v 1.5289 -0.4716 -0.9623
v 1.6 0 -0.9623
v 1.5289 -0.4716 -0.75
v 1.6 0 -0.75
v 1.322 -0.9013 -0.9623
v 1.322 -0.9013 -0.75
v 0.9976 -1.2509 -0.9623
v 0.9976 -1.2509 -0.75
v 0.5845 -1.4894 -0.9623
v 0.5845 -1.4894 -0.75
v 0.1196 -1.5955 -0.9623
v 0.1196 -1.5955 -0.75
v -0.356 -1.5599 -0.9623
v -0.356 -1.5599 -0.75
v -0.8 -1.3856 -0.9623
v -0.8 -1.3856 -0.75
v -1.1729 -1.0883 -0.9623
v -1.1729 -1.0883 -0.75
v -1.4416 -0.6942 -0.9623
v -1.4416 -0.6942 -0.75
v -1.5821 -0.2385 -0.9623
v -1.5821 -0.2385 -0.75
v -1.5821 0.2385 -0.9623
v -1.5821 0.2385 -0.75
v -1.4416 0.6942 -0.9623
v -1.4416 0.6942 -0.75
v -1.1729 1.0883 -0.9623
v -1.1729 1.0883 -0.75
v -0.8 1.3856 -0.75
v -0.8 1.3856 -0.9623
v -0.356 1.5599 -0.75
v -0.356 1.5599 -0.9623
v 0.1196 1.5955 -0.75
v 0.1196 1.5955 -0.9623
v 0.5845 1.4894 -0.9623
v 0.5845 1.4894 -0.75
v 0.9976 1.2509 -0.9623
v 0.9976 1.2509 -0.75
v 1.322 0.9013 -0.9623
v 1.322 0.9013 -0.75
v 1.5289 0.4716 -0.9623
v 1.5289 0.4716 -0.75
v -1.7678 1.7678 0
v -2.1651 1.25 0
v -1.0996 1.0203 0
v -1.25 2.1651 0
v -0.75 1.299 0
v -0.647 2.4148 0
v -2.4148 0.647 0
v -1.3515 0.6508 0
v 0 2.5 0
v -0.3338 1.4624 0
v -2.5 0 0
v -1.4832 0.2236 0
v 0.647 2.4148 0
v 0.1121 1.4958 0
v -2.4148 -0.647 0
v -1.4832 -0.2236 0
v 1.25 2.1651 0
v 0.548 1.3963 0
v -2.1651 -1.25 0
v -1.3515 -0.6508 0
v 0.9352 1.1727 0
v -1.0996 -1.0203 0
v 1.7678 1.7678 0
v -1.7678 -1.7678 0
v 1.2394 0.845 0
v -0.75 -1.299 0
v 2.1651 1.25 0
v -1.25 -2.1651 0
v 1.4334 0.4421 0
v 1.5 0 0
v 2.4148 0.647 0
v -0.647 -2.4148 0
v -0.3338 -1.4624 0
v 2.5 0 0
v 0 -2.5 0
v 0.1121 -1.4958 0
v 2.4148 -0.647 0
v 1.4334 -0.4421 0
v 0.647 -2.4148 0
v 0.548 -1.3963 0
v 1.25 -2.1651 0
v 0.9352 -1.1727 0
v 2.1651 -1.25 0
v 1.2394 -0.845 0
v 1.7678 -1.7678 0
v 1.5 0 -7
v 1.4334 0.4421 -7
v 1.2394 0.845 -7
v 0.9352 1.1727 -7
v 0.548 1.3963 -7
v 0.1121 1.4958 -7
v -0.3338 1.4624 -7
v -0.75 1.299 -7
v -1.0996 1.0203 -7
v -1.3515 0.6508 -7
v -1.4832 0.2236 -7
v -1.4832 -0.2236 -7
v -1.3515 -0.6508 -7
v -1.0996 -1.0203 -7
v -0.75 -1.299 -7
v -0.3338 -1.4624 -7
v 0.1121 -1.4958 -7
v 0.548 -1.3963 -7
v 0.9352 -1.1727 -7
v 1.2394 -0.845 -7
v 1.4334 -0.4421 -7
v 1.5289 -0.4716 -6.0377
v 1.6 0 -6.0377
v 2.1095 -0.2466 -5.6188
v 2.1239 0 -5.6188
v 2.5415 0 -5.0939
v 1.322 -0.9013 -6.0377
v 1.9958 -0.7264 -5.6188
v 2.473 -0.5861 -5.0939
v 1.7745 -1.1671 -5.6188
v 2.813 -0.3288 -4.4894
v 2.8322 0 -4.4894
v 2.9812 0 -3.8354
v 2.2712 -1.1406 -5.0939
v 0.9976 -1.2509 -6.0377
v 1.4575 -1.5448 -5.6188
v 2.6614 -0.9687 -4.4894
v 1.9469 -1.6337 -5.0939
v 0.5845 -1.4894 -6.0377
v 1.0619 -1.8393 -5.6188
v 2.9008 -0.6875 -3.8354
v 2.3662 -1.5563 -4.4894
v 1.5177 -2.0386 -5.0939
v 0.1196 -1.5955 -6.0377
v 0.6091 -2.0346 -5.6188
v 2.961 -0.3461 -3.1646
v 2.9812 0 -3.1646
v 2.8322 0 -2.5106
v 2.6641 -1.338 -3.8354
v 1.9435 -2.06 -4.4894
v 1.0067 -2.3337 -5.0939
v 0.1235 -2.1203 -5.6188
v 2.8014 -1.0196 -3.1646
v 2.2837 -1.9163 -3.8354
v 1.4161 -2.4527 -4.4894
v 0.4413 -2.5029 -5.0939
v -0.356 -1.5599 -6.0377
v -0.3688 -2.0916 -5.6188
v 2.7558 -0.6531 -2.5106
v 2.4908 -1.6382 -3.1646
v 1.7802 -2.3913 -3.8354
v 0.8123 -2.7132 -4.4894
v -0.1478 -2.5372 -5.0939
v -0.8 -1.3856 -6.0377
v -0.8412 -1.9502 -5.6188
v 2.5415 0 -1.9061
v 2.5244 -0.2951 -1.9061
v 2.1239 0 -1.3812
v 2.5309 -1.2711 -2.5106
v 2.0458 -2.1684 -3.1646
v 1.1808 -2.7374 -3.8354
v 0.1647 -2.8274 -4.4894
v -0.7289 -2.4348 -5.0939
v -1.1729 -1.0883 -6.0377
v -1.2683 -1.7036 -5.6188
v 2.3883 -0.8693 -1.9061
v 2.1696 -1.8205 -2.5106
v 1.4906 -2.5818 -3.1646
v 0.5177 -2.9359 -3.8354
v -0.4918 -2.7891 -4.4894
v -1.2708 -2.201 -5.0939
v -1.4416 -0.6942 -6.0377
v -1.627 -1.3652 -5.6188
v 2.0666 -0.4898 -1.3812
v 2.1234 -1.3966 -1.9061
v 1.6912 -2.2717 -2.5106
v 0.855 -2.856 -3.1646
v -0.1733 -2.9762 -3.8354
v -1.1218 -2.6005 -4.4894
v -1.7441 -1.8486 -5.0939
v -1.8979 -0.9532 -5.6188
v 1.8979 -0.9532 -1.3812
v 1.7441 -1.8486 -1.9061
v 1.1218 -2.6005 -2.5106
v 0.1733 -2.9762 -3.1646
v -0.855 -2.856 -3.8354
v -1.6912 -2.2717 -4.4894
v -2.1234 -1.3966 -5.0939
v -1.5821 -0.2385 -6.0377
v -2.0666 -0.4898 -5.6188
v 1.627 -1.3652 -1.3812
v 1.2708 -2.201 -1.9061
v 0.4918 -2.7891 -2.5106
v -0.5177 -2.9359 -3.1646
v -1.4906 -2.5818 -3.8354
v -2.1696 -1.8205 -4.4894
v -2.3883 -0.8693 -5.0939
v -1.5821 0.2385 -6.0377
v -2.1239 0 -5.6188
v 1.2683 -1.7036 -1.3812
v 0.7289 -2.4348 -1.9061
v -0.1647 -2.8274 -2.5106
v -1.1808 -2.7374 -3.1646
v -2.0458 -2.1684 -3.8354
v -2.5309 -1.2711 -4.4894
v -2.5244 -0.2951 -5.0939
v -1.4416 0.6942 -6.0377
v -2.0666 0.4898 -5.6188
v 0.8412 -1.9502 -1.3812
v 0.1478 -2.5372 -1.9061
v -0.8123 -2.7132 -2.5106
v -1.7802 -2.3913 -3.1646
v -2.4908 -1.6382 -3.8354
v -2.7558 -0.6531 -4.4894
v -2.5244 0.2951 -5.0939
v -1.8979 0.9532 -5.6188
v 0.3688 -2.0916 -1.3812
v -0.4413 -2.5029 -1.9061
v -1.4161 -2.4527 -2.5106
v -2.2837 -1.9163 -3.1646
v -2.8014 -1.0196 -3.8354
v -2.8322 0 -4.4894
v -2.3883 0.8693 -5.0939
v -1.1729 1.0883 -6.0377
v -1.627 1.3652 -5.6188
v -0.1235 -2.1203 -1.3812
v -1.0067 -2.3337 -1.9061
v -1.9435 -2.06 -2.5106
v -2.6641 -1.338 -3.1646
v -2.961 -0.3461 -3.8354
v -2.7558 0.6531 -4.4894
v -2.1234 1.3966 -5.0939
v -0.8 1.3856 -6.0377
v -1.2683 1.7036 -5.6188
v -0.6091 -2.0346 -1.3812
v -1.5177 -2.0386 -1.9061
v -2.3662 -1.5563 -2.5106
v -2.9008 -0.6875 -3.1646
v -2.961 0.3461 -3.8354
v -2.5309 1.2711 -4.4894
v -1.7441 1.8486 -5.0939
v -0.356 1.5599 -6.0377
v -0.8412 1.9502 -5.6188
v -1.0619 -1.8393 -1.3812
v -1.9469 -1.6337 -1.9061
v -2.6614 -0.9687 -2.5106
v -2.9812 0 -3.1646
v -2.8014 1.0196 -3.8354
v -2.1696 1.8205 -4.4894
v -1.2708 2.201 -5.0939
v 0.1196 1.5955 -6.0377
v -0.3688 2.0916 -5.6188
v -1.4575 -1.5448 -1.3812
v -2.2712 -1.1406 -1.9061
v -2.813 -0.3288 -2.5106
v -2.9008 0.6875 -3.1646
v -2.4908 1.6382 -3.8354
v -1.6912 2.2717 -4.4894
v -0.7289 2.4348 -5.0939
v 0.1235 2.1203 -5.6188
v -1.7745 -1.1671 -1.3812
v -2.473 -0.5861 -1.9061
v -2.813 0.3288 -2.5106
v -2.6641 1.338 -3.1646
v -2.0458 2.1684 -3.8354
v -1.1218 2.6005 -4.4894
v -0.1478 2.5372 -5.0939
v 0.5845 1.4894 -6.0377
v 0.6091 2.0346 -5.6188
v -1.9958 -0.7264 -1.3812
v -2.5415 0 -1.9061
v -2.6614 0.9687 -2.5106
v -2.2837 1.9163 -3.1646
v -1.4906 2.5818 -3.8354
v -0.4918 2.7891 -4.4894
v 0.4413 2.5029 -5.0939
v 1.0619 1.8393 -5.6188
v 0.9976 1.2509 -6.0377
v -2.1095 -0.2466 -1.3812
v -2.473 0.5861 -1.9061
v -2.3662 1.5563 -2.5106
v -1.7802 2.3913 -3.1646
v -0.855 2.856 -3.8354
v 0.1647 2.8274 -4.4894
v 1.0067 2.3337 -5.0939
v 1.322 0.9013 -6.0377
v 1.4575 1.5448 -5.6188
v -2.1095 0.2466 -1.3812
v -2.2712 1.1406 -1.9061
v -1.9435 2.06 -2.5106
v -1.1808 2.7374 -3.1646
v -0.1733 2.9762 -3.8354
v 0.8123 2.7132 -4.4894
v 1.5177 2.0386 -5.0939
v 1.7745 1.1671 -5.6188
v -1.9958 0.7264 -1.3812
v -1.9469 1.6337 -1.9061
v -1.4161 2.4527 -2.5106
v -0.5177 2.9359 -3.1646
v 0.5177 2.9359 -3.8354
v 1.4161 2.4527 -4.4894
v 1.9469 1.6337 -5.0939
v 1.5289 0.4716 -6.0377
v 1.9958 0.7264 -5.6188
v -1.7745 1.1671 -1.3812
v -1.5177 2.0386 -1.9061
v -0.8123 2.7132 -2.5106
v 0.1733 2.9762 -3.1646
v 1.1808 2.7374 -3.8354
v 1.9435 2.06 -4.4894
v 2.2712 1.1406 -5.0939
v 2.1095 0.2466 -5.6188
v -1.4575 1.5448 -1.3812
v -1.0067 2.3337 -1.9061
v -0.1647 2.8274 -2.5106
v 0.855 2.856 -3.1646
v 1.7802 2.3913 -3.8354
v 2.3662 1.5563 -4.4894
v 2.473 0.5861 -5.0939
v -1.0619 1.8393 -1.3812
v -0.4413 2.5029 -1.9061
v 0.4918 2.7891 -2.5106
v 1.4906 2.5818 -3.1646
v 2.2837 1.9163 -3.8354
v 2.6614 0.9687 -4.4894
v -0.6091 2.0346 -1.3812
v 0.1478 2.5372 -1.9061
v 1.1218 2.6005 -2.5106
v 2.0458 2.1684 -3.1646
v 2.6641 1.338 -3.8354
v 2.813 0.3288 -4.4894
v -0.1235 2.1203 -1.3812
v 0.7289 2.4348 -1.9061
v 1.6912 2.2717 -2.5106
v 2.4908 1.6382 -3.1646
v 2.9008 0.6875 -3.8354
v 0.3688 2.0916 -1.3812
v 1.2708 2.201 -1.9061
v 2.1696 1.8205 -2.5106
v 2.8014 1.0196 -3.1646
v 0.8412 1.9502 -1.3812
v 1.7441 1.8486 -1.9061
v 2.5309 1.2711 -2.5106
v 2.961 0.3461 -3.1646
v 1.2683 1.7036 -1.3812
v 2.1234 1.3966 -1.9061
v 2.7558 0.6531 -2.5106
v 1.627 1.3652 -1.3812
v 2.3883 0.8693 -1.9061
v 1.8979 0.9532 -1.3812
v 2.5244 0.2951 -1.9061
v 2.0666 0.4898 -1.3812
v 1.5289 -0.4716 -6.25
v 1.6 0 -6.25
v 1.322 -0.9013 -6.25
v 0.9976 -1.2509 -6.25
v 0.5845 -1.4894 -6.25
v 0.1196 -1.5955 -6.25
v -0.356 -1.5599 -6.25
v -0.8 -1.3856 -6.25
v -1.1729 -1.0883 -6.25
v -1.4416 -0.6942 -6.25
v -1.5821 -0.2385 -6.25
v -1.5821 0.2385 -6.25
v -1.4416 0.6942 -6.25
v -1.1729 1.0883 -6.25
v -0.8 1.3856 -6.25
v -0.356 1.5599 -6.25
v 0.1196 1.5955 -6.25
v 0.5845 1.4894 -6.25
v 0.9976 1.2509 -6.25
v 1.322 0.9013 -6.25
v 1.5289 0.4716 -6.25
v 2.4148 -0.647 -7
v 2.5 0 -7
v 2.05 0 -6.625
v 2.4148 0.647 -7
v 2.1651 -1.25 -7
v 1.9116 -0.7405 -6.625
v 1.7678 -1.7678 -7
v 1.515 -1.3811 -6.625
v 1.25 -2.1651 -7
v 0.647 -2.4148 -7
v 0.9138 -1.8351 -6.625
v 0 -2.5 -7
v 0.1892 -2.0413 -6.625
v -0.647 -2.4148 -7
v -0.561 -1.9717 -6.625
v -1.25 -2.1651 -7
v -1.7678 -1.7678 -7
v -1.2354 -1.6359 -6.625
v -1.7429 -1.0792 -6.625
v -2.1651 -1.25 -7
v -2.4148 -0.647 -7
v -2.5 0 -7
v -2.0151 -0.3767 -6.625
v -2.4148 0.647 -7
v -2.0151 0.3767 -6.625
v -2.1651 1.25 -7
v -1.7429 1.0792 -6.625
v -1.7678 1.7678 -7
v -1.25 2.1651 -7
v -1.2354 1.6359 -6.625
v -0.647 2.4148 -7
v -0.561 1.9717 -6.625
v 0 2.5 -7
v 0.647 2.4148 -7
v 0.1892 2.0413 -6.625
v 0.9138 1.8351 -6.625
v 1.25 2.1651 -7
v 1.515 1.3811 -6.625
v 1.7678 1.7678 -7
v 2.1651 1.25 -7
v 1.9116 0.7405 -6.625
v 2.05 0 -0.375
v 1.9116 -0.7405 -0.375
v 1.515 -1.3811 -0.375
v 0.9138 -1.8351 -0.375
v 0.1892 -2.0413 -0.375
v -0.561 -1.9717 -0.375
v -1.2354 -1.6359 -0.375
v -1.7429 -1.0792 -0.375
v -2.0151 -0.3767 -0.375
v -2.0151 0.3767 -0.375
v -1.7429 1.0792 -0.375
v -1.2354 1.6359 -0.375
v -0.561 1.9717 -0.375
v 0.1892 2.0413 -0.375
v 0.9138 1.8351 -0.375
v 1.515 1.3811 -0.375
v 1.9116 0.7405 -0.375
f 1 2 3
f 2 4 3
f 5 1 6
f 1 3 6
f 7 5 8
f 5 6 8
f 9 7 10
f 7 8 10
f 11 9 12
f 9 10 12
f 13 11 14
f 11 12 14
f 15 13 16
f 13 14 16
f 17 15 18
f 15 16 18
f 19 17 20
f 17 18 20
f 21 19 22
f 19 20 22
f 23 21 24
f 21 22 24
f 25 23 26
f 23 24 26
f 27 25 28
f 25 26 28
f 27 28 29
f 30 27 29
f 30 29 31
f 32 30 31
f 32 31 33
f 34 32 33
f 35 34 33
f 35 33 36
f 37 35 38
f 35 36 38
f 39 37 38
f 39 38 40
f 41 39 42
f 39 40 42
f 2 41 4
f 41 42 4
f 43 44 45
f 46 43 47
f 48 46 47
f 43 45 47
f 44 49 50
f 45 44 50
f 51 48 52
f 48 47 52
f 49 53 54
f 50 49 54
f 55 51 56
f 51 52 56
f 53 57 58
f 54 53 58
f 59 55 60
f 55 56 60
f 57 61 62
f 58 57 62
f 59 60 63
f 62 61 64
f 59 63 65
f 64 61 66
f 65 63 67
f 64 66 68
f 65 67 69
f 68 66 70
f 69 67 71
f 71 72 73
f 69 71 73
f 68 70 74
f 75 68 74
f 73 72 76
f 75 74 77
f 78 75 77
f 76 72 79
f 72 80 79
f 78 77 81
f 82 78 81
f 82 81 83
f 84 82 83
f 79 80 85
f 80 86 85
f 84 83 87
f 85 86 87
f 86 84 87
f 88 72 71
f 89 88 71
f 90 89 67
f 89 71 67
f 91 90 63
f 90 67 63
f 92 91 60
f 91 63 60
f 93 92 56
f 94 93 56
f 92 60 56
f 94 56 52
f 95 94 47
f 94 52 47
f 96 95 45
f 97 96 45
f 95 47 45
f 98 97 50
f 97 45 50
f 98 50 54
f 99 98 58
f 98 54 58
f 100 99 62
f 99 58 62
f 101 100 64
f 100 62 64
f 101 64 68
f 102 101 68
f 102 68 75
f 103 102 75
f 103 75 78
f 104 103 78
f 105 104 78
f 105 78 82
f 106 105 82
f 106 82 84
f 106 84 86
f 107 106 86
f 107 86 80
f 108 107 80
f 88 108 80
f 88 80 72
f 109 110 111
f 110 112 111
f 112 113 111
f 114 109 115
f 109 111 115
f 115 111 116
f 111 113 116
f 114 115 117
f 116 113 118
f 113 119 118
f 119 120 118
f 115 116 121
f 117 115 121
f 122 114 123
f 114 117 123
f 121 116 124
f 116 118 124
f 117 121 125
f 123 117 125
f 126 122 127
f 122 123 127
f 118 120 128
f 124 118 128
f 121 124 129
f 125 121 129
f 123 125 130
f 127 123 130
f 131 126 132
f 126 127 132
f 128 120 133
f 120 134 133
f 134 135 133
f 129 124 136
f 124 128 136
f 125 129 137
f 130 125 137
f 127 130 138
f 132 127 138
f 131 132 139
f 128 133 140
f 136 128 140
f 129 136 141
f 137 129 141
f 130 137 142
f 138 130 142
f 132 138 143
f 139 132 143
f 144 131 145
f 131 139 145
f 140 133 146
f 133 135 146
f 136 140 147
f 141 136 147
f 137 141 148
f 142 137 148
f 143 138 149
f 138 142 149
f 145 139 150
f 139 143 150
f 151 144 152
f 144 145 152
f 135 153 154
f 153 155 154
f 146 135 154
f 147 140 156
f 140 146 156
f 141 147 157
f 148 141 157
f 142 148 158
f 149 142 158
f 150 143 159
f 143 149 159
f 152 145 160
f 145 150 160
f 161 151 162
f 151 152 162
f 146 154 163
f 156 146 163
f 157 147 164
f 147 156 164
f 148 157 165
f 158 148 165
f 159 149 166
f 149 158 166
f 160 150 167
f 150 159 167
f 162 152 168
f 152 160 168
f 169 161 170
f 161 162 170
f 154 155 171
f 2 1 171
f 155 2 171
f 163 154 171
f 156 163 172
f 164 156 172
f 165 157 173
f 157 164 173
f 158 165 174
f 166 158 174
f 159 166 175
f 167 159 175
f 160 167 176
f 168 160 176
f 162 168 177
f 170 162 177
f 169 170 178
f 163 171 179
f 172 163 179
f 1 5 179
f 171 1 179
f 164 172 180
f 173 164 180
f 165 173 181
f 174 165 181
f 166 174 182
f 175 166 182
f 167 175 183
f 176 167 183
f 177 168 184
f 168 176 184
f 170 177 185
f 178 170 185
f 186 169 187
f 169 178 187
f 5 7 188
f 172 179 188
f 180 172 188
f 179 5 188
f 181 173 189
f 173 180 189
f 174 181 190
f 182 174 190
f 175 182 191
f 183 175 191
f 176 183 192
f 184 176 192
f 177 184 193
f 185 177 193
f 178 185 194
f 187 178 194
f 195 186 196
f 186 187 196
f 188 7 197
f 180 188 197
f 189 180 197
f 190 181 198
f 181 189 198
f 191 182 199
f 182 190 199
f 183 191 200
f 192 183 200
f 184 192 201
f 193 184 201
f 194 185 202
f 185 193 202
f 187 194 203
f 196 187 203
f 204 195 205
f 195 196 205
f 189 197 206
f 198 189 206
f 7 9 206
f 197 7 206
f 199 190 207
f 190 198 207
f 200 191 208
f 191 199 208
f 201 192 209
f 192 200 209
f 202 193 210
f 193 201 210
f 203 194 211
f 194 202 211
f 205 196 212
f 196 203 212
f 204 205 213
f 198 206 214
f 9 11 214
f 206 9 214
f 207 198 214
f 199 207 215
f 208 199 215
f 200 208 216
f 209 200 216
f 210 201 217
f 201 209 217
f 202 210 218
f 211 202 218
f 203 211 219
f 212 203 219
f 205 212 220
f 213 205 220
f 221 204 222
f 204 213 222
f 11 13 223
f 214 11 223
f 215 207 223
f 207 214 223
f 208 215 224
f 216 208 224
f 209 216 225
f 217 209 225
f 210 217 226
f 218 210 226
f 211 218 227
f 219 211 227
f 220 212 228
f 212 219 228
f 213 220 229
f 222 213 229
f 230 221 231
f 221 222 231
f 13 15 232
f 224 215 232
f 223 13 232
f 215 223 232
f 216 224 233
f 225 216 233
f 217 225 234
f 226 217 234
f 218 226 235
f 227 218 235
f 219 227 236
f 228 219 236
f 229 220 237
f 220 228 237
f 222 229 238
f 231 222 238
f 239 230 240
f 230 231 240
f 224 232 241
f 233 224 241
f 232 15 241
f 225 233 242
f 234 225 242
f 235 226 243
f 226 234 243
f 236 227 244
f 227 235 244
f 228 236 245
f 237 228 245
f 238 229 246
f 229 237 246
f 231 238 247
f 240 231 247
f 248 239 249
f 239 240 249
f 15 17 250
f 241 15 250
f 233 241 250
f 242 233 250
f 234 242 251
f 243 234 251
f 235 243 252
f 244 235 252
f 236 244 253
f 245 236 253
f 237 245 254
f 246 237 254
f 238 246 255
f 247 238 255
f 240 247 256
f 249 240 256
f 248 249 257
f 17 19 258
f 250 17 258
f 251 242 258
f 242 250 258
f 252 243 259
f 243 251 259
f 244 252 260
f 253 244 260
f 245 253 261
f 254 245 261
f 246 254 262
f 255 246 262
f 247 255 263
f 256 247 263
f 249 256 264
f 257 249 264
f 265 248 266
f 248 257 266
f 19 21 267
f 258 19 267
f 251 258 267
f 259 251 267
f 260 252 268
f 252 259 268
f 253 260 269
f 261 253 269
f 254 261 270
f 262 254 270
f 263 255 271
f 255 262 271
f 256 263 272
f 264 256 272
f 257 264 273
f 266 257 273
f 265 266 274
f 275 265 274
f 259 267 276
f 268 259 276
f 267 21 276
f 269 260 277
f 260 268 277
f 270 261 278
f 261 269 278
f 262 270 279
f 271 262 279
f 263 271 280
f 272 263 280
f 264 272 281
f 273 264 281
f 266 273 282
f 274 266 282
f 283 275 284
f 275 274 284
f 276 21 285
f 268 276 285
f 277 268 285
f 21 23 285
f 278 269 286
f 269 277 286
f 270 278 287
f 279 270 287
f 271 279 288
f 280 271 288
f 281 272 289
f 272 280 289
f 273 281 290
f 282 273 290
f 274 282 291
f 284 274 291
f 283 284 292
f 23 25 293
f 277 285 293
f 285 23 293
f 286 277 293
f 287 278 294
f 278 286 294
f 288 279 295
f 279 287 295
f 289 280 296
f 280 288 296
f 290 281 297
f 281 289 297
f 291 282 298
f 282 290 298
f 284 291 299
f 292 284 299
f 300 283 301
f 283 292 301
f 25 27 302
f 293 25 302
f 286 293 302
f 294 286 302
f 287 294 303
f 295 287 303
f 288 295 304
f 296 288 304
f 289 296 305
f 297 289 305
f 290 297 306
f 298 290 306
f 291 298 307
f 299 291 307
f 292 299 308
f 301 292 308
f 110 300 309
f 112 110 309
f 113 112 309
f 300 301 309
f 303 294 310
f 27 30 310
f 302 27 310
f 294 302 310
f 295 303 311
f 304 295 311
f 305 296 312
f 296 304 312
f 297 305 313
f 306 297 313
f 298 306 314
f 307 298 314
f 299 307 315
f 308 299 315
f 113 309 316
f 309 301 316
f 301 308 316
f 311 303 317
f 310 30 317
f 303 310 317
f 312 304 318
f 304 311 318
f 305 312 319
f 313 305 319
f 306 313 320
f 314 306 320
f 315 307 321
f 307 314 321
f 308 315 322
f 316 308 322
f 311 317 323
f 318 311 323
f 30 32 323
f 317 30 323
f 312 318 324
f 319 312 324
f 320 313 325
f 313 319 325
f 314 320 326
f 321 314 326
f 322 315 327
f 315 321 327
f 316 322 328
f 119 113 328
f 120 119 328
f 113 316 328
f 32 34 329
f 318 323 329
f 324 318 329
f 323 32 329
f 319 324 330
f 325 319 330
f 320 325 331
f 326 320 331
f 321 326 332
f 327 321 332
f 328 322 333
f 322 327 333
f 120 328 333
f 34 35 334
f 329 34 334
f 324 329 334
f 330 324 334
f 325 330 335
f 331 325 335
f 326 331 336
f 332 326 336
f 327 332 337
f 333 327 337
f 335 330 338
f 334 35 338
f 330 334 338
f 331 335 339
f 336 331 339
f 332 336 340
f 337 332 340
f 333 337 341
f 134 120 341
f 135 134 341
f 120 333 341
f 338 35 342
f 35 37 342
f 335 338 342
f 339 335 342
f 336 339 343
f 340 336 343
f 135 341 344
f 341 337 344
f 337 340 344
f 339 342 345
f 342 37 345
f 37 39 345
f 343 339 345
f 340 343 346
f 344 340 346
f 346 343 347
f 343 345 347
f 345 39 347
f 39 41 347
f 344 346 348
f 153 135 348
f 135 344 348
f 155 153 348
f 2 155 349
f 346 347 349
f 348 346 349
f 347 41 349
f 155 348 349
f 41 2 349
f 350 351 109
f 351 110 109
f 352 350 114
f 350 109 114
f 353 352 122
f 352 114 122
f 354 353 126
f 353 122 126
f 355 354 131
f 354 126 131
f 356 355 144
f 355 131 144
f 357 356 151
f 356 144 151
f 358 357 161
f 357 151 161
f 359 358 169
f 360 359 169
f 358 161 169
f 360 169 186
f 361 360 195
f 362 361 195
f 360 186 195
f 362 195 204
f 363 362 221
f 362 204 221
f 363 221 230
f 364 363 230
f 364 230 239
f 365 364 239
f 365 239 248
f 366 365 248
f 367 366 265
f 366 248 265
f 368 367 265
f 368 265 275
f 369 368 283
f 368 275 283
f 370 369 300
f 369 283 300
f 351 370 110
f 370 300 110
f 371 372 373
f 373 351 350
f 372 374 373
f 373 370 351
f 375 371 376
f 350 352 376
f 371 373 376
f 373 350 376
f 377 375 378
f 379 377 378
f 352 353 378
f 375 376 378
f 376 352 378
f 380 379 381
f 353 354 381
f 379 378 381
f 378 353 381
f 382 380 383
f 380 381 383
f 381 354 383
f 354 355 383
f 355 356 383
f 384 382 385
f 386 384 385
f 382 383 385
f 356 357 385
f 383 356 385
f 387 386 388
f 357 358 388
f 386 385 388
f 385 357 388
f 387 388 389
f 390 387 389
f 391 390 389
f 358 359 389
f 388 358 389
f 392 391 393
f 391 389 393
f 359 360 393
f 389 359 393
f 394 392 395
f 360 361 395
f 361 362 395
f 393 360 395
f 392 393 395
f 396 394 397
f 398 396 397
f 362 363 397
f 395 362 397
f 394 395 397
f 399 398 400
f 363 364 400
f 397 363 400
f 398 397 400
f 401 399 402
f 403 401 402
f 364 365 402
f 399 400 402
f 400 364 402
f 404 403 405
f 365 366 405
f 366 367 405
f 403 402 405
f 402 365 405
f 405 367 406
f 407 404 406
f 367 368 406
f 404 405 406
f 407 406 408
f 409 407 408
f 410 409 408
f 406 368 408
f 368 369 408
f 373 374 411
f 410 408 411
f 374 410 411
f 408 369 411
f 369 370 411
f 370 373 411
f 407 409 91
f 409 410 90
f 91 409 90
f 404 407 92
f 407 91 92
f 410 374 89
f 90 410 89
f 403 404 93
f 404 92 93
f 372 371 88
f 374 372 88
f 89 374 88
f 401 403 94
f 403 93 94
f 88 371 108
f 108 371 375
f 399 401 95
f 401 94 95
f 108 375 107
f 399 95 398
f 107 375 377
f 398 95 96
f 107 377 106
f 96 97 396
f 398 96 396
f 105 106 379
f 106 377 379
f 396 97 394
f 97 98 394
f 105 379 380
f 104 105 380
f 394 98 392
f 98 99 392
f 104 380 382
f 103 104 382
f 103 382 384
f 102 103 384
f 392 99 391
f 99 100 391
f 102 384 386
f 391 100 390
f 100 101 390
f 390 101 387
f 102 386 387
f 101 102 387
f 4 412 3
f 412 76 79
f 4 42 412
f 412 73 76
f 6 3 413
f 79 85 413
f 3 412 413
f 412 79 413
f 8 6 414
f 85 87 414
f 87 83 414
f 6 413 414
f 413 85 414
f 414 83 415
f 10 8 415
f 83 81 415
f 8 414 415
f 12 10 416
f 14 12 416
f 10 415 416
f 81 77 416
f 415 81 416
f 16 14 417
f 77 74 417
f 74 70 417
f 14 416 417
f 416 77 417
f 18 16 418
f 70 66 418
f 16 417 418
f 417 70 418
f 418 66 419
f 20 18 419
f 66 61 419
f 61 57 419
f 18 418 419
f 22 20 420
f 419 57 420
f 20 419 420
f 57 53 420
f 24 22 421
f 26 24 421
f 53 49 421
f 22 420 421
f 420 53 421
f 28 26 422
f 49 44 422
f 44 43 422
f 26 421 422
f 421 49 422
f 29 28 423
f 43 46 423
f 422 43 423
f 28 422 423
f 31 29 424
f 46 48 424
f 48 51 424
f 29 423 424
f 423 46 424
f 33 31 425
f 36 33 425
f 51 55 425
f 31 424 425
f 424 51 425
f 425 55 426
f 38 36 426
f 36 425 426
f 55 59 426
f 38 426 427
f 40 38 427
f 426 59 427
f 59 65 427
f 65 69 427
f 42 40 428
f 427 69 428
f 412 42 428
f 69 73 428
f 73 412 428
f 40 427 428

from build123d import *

# Parameters (mm, degrees)
SKETCH2_R          = 1.5
CUT_EXTRUDE1_DEPTH = 9.185352772


with BuildPart() as part:
    # Sketch1 → Revolve1 (revolve)
    with BuildSketch(Plane(origin=(0, 0, 0), x_dir=(1, 0, 0), z_dir=(0, 1, 0))):
        with BuildLine():
            Line((0, 0), (0, 7))
            Line((0, 7), (2.5, 7))
            Line((2.5, 7), (1.6, 6.25))
            Line((1.6, 6.25), (1.6, 6.037715508))
            ThreePointArc((1.6, 6.037715508), (3, 3.5), (1.6, 0.962284492))
            Line((1.6, 0.962284492), (1.6, 0.75))
            Line((1.6, 0.75), (2.5, 0))
            Line((2.5, 0), (0, 0))
        make_face()
    revolve(axis=Axis((0, 0, 0), (0, 0, -1)))

    # Sketch2 → Cut-Extrude1 (cut, through all)
    with BuildSketch(Plane.XY):
        Circle(SKETCH2_R)
    extrude(amount=-CUT_EXTRUDE1_DEPTH, mode=Mode.SUBTRACT)


solid = part.part
